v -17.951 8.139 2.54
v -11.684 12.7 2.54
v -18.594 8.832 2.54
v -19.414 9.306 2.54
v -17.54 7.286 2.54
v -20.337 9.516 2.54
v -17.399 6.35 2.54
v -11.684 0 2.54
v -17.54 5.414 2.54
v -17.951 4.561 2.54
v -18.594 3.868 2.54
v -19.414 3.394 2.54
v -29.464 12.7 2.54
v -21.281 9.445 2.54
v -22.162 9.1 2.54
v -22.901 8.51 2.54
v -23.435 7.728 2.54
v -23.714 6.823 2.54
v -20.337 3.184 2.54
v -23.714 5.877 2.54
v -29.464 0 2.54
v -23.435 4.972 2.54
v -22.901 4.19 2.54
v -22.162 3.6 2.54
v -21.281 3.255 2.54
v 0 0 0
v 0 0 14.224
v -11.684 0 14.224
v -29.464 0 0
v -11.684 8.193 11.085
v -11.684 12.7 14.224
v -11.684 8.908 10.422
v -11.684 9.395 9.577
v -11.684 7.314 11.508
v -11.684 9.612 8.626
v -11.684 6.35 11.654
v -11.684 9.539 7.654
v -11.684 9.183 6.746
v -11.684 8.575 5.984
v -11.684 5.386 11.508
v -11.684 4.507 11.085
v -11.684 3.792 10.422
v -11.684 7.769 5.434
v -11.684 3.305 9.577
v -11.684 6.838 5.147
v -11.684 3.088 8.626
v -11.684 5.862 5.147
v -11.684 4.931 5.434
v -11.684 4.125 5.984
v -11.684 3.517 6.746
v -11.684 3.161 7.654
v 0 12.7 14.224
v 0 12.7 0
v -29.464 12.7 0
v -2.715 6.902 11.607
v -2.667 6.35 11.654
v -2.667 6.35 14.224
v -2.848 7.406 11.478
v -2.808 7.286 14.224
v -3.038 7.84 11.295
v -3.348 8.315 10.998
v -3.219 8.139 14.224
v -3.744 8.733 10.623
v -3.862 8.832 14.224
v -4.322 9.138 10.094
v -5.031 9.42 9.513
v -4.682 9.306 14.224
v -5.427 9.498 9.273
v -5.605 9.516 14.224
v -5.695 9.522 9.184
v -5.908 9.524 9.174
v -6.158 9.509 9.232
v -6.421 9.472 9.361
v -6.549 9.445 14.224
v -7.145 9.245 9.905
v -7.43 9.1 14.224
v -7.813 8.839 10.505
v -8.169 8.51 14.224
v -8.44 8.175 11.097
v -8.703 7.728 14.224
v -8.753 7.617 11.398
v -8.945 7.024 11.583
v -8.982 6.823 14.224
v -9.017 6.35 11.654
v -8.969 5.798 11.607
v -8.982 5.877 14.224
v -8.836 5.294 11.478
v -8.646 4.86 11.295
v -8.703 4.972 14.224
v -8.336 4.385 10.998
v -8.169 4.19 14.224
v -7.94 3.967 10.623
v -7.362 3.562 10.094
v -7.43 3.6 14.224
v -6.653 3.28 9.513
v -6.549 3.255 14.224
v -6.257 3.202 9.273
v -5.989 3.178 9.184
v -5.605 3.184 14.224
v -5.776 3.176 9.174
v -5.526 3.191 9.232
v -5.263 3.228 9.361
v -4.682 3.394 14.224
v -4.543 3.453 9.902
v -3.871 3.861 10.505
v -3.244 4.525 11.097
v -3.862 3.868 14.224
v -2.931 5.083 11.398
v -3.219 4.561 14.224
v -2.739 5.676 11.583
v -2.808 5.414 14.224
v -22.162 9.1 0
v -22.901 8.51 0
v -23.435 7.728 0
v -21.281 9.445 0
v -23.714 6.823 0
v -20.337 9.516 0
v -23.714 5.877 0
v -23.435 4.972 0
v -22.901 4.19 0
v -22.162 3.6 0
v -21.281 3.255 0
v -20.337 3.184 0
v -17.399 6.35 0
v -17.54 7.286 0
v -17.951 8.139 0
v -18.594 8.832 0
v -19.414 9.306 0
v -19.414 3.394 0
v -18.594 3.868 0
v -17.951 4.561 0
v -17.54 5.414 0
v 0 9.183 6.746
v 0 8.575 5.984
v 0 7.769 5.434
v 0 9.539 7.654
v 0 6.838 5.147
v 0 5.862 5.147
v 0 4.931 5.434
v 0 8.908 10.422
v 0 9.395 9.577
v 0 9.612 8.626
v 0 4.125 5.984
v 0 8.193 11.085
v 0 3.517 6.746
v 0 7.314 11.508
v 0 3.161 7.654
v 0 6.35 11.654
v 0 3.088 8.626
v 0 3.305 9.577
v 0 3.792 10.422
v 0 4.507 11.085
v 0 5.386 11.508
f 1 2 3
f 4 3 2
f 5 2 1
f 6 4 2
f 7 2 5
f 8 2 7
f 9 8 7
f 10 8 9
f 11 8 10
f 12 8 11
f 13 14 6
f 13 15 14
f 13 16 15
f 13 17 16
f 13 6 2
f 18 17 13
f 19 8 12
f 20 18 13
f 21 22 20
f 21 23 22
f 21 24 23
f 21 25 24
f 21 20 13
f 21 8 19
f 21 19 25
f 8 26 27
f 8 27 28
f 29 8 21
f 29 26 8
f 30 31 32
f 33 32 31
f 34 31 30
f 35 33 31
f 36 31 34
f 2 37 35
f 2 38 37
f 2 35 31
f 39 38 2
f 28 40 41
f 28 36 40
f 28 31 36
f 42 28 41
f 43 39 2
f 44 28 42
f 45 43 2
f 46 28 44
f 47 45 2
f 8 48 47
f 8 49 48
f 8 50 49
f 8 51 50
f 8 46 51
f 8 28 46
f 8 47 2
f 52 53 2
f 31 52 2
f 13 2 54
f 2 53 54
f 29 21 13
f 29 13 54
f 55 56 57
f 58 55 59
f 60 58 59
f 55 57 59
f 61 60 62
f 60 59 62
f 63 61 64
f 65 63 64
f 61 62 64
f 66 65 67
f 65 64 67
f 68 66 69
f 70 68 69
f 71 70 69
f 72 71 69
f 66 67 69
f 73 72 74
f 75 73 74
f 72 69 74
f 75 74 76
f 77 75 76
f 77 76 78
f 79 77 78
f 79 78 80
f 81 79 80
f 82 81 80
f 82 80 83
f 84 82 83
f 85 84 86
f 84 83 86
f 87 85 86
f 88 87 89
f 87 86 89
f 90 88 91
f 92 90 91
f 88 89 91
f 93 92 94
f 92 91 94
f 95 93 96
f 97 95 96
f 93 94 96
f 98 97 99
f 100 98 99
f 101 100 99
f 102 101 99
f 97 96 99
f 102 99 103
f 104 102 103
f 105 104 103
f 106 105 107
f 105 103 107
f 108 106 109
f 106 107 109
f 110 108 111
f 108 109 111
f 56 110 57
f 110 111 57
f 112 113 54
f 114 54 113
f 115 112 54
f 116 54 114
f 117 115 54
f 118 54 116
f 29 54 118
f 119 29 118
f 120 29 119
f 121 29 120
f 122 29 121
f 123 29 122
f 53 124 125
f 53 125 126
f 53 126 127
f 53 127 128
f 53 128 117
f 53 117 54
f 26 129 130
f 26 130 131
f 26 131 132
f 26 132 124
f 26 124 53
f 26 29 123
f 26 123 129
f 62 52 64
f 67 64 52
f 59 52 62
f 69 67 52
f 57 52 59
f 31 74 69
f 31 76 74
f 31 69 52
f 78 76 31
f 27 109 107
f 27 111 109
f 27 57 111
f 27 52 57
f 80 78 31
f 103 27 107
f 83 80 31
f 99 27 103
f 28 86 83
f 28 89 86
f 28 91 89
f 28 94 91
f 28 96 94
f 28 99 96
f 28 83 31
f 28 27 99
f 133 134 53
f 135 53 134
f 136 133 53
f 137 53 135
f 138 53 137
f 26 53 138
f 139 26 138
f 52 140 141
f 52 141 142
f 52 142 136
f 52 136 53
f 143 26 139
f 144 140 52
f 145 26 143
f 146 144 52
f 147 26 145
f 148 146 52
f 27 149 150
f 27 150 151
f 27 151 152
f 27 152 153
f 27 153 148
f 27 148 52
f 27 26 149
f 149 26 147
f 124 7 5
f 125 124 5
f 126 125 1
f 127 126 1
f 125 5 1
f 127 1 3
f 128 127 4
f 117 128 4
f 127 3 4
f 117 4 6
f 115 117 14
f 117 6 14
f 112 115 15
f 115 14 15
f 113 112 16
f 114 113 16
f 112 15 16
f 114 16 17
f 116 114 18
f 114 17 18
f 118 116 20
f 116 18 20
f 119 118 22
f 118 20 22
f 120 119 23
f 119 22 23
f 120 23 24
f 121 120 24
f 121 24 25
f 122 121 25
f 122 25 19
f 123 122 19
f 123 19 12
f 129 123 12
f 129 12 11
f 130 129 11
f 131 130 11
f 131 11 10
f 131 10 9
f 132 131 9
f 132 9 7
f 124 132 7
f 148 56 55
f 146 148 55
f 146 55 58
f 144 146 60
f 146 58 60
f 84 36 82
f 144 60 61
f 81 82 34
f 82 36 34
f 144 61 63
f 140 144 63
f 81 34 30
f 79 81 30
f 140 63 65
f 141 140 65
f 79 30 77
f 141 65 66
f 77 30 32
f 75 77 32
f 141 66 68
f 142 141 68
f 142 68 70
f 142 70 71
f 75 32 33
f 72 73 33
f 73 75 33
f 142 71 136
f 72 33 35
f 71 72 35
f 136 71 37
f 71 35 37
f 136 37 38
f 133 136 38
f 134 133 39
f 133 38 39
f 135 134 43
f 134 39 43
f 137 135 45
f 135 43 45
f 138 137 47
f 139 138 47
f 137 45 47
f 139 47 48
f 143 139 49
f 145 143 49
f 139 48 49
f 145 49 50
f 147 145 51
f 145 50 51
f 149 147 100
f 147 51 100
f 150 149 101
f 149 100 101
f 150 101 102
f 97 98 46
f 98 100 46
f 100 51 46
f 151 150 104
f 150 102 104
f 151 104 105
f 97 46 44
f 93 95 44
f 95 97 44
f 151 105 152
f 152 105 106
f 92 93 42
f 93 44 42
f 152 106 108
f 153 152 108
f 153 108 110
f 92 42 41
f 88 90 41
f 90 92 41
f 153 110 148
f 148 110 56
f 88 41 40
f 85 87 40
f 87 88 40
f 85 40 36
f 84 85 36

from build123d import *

# Parameters (mm, degrees)
EXTRUDE1_DEPTH      = 12.7
SKETCH2_R           = 3.27152
EXTRUDE2_DEPTH      = 27.071834918
EXTRUDE3_REACH      = 37.096
EXTRUDE3_END_RADIUS = 3.27152
SKETCH3_R           = 3.175
SKETCH4_R           = 3.175
EXTRUDE4_DEPTH      = 35.145763344


with BuildPart() as part:
    # Sketch1 → Extrude1 (new body)
    with BuildSketch(Plane(origin=(0, 0, 0), x_dir=(1, 0, 0), z_dir=(0, 1, 0))):
        Polygon((0, 0), (0, -14.224), (-11.684, -14.224), (-11.684, -2.54), (-29.464, -2.54), (-29.464, 0), align=None)
    extrude(amount=EXTRUDE1_DEPTH)

    # Sketch2 → Extrude2 (cut, through all)
    with BuildSketch(Plane.ZY.offset(11.684)):
        with Locations((8.382, 6.35)):
            Circle(SKETCH2_R)
    extrude(amount=-EXTRUDE2_DEPTH, mode=Mode.SUBTRACT)

    # Extrude3: up to this cylinder (the profile starts outside it)
    extrude3_end = Plane(origin=(-5.842, 6.35, 8.382), z_dir=(-1, 0, 0)) * Cylinder(EXTRUDE3_END_RADIUS, 81.73504, mode=Mode.PRIVATE)
    # Sketch3 → Extrude3 (cut, up to the surface)
    with BuildSketch(Plane.XY.offset(14.224), mode=Mode.PRIVATE) as extrude3_sk1:
        with Locations((-5.842, 6.35)):
            Circle(SKETCH3_R)
    extrude3_tool1 = extrude(extrude3_sk1.sketch, amount=-EXTRUDE3_REACH, mode=Mode.PRIVATE) - extrude3_end
    add(extrude3_tool1.solids().sort_by_distance((-5.842, 6.35, 14.224))[0], mode=Mode.SUBTRACT)

    # Sketch4 → Extrude4 (cut, through all)
    with BuildSketch(Plane.XY.offset(2.54)):
        with Locations((-20.574, 6.35)):
            Circle(SKETCH4_R)
    extrude(amount=-EXTRUDE4_DEPTH, mode=Mode.SUBTRACT)


solid = part.part
